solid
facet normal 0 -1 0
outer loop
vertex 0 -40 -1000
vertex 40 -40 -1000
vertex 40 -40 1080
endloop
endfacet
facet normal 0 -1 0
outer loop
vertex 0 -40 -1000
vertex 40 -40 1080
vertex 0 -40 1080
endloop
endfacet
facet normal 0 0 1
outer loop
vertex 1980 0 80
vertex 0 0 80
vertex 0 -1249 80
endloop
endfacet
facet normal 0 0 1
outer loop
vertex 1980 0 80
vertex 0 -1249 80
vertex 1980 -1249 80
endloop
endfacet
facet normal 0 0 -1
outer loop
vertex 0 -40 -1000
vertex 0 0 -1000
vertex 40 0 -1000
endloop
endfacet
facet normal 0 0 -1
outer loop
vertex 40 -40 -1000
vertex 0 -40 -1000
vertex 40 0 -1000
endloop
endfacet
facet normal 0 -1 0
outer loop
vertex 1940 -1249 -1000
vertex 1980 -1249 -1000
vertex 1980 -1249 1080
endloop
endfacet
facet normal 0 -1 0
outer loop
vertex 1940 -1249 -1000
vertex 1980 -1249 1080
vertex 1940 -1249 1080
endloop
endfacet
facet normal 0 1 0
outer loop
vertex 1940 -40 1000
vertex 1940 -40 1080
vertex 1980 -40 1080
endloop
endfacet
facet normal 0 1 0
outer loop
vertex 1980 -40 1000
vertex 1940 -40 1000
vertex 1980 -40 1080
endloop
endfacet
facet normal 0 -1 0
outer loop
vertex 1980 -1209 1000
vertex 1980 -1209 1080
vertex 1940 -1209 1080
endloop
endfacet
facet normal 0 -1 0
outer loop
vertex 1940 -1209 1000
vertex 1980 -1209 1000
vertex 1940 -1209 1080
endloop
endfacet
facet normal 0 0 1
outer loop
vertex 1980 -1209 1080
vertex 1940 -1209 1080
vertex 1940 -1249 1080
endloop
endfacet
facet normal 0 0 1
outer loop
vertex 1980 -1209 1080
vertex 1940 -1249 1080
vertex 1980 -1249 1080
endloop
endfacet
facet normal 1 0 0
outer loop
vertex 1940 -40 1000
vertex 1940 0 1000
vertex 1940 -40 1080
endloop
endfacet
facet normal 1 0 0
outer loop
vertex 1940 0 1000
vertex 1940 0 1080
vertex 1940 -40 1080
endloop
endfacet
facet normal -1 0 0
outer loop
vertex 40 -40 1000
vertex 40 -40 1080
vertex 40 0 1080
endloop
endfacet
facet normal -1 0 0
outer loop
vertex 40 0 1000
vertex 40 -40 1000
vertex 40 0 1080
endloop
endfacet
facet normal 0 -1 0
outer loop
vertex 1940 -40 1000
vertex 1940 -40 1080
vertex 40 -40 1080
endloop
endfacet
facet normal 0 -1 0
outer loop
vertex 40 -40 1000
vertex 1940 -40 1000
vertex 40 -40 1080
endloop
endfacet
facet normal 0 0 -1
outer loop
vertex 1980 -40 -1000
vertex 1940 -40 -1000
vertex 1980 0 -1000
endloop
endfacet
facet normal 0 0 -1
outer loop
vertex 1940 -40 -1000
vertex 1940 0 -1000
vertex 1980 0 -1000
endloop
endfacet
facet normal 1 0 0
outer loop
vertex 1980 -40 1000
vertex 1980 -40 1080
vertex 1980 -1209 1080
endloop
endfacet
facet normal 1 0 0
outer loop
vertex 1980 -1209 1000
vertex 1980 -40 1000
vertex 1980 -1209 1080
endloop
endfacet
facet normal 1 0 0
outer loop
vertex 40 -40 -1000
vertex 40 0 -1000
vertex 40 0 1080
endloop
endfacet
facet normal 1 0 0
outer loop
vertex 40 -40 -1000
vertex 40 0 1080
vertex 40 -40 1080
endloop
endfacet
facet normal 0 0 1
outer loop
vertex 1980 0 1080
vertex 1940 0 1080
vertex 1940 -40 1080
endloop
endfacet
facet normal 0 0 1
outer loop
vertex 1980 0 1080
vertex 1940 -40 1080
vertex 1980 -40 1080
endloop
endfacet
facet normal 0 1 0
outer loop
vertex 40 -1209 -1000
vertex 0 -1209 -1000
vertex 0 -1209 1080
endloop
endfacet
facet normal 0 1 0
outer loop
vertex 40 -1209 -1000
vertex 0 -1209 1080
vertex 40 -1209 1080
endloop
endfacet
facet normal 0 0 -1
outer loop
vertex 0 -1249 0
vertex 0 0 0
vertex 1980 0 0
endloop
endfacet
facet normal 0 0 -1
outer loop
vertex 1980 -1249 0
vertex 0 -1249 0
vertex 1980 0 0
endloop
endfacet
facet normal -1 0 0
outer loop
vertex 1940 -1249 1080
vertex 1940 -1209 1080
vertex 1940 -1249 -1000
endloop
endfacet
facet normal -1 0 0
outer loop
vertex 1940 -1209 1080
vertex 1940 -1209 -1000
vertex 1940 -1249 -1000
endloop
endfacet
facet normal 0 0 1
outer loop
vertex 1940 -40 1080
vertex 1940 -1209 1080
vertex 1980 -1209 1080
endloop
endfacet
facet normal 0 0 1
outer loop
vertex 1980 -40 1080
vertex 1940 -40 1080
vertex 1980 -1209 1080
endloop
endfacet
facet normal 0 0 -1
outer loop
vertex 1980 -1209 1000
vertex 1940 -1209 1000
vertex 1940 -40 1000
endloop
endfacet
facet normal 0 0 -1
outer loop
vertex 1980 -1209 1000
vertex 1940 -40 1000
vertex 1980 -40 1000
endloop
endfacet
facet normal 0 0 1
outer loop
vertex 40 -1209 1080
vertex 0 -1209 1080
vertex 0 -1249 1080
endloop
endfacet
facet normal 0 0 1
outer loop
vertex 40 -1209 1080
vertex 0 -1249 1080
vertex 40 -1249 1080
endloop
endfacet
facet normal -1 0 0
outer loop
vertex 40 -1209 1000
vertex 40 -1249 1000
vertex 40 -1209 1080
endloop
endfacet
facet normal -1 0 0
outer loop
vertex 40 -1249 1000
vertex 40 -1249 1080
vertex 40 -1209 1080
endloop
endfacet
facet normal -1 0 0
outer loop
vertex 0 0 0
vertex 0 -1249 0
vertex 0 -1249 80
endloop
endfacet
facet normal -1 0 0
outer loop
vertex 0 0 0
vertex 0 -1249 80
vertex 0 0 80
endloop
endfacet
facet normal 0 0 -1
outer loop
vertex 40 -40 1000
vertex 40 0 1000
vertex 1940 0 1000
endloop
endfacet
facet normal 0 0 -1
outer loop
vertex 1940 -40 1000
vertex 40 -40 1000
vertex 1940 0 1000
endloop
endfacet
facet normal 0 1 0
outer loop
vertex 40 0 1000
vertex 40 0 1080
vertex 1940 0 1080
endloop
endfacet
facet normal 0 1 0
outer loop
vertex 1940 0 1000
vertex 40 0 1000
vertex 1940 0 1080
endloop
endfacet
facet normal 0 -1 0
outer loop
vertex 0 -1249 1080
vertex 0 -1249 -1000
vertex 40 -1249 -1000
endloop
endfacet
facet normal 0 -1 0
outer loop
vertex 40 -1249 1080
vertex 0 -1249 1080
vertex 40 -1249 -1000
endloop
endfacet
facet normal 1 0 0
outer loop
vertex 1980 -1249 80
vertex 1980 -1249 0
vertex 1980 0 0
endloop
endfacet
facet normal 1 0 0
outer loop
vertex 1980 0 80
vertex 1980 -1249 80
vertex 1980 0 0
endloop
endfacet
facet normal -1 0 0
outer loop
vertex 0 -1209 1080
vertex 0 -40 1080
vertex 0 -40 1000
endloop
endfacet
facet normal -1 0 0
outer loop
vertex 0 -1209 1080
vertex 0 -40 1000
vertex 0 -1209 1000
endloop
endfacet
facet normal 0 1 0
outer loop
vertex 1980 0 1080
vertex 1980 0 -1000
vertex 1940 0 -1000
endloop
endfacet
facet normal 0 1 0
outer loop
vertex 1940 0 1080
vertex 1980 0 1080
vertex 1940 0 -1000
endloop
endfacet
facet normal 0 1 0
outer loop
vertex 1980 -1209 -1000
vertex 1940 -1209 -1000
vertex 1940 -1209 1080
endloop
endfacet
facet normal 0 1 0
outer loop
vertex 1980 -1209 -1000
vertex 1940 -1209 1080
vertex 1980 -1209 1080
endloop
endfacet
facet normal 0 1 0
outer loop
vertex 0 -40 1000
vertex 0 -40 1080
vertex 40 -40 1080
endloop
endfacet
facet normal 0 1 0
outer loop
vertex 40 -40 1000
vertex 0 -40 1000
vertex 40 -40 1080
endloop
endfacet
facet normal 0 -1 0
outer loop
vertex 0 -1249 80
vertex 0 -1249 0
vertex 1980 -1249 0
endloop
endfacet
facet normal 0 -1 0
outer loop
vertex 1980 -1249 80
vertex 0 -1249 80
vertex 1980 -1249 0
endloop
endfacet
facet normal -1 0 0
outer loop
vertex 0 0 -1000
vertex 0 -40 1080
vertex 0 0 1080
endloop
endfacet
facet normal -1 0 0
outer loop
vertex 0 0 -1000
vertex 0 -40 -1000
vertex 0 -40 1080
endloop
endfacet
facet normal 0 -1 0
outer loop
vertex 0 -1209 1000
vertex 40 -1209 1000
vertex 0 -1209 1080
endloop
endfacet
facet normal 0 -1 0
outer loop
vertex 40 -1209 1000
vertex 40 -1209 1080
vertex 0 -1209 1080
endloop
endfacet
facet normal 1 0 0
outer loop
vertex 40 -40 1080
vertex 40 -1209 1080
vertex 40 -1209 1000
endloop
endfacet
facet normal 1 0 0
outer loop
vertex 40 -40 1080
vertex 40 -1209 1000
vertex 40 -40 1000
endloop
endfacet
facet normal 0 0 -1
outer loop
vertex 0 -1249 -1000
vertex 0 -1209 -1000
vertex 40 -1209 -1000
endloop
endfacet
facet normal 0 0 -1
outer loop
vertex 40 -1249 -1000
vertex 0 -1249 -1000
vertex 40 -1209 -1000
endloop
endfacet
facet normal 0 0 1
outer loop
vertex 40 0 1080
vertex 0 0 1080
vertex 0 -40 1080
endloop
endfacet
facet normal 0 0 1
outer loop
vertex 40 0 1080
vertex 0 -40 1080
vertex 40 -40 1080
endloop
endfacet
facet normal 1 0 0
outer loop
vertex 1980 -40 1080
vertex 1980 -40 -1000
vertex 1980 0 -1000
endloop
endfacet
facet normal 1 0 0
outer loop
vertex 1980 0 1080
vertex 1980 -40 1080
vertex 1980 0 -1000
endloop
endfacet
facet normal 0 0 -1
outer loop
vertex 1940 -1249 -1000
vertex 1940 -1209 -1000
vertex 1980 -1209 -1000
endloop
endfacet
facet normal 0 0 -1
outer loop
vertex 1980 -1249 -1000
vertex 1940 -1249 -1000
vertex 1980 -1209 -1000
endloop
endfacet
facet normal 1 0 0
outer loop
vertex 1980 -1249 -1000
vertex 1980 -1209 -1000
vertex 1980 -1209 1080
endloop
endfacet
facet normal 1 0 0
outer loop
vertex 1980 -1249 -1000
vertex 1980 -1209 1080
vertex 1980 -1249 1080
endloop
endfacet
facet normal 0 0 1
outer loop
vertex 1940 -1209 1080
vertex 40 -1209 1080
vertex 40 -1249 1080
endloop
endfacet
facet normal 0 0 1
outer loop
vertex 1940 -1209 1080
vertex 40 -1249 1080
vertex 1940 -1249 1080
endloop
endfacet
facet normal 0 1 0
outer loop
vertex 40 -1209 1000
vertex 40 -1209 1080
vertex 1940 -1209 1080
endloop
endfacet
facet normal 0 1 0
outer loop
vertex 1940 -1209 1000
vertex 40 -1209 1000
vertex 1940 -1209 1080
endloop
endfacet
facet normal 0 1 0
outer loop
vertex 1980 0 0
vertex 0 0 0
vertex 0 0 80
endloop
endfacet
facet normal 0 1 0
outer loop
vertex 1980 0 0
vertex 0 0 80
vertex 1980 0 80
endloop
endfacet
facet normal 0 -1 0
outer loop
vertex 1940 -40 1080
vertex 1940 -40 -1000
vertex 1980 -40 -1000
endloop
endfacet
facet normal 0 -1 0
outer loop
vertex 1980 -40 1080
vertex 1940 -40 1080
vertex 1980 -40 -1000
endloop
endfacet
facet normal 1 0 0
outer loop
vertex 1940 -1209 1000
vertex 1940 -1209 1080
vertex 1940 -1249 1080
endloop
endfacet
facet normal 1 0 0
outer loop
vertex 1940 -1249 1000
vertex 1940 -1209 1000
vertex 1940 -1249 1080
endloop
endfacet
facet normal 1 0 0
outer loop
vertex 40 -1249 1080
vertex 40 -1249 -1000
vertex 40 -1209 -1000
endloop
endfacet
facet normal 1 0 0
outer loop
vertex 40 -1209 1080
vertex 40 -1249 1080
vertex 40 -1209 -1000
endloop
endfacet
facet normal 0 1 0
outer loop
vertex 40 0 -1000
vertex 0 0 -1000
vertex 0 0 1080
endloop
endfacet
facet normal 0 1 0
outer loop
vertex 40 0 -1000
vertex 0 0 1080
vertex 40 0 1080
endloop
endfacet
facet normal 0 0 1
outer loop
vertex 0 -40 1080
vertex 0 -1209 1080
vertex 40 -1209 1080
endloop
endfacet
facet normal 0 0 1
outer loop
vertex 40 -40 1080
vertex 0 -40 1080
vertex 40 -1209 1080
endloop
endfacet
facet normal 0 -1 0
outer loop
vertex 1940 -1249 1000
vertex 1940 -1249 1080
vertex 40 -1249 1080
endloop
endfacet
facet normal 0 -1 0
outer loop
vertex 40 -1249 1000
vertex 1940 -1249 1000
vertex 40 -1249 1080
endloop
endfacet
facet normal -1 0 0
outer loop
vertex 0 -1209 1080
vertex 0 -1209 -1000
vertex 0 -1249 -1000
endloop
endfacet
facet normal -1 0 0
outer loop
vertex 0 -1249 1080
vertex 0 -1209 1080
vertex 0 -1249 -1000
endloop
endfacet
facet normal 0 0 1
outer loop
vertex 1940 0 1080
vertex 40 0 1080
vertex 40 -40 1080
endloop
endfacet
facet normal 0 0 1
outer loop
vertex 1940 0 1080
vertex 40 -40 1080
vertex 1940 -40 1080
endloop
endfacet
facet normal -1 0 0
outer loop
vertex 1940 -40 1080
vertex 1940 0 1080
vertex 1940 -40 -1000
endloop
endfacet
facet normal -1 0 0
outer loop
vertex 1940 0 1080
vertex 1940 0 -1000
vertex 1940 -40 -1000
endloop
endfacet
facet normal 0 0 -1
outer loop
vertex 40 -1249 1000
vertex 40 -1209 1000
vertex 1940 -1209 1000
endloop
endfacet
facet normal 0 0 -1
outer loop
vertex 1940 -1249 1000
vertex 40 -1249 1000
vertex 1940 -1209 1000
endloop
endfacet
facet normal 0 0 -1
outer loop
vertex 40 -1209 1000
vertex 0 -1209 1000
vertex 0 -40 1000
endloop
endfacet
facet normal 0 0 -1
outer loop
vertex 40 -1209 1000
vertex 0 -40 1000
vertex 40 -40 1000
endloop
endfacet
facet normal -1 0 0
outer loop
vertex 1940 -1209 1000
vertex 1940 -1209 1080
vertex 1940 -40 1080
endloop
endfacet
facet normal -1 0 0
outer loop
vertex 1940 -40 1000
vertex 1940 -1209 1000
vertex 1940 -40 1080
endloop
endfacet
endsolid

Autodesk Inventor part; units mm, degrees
ref_plane "YZ Plane" through (0, 0, 0) normal (1, 0, 0) x (0, 1, 0)
ref_plane "XZ Plane" through (0, 0, 0) normal (0, 1, 0) x (-1, 0, 0)
ref_plane "XY Plane" through (0, 0, 0) normal (0, 0, 1) x (1, 0, 0)
sketch "Sketch1" plane through (0, 0, 0) normal (0, 0, 1) x (1, 0, 0)
  line L0 (0, 0) -> (40, 0)
  line L1 (40, 0) -> (40, -40)
  line L2 (40, -40) -> (0, -40)
  line L3 (0, -40) -> (0, 0)
  line L4 (40, 0) -> (1940, 0)
  line L5 (1940, 0) -> (1940, -40)
  line L6 (1940, -40) -> (1980, -40)
  line L7 (1980, -40) -> (1980, 0)
  line L8 (1980, 0) -> (1940, 0)
  line L9 (40, -40) -> (1940, -40)
  line L10 (0, -40) -> (0, -1209)
  line L11 (0, -1209) -> (40, -1209)
  line L12 (40, -1209) -> (40, -40)
  line L13 (0, -1209) -> (0, -1249)
  line L14 (0, -1249) -> (40, -1249)
  line L15 (40, -1249) -> (40, -1209)
  line L16 (1940, -1209) -> (1940, -1249)
  line L17 (1940, -1249) -> (40, -1249)
  line L18 (1940, -1209) -> (1980, -1209)
  line L19 (1980, -1209) -> (1980, -1249)
  line L20 (1980, -1249) -> (1940, -1249)
  line L21 (1940, -1209) -> (1940, -40)
  line L22 (1980, -40) -> (1980, -1209)
  line L23 (40, -1209) -> (1940, -1209)
  line L24 (40, -520) -> (1940, -520)
  line L25 (40, -560) -> (1940, -560)
  line L26 (490, -40) -> (490, -520)
  line L27 (530, -520) -> (530, -40)
  line L28 (830, -40) -> (830, -520)
  line L29 (870, -520) -> (870, -40)
  line L30 (1130, -40) -> (1130, -520)
  line L31 (1170, -520) -> (1170, -40)
  line L32 (1470, -40) -> (1470, -520)
  line L33 (1510, -520) -> (1510, -40)
  line L34 (240, -560) -> (240, -1209)
  line L35 (280, -1209) -> (280, -560)
  line L36 (600, -560) -> (600, -1209)
  line L37 (640, -1209) -> (640, -560)
  line L38 (900, -560) -> (900, -1209)
  line L39 (940, -1209) -> (940, -560)
  line L40 (1060, -560) -> (1060, -1209)
  line L41 (1100, -1209) -> (1100, -560)
  line L42 (1420, -560) -> (1420, -1209)
  line L43 (1460, -1209) -> (1460, -560)
  line L44 (1460, -749.4424) -> (1940, -749.4424)
  line L45 (1940, -749.4424) -> (1940, -789.4424)
  line L46 (1940, -789.4424) -> (1460, -789.4424)
  line L47 (1460, -789.4424) -> (1460, -749.4424)
  line L48 (1460, -984.7722) -> (1940, -984.7722)
  line L49 (1940, -984.7722) -> (1940, -1024.7722)
  line L50 (1940, -1024.7722) -> (1460, -1024.7722)
  line L51 (1460, -1024.7722) -> (1460, -984.7722)
  dimension "d15" = 40
  dimension "d16" = 480
  dimension "d17" = 649
  dimension "d11" = 40
  dimension "d12" = 40
  dimension "d13" = 40
  dimension "d14" = 40
  dimension "d18" = 40
  dimension "d19" = 40
  dimension "d20" = 40
  dimension "d21" = 40
  dimension "d22" = 470
  dimension "d23" = 340
  dimension "d24" = 490
  dimension "d25" = 340
  dimension "d26" = 40
  dimension "d27" = 40
  dimension "d28" = 40
  dimension "d29" = 40
  dimension "d30" = 40
  dimension "d31" = 200
  dimension "d32" = 880
  dimension "d35" = 480
  dimension "d51" = 40
  dimension "d52" = 40
  dimension "d53" = 1980
  dimension "d108" = 360
  dimension "d109" = 240
extrude "Extrusion1" [suppressed]
extrude "Extrusion7" [suppressed]
extrude "Extrusion8" [suppressed]
extrude "Extrusion9" [suppressed]
extrude "Extrusion2" [suppressed]
extrude "Extrusion10" [suppressed]
extrude "Extrusion11" [suppressed]
extrude "Extrusion12" [suppressed]
extrude "Extrusion13" [suppressed]
extrude "Extrusion14" [suppressed]
extrude "Extrusion15" [suppressed]
extrude "Extrusion16" [suppressed]
extrude "Extrusion17" [suppressed]
extrude "Extrusion18" [suppressed]
extrude "Extrusion19" [suppressed]
extrude "Extrusion20" [suppressed]
extrude "Extrusion3" add sketch "Sketch1" along normal blind 1080 and the other way blind 1000 separate body contours L0 L1 L2 L3
extrude "Extrusion21" add sketch "Sketch1" along normal blind 1080 and the other way blind 1000 separate body contours L11 L15 L14 L13
extrude "Extrusion22" add sketch "Sketch1" along normal blind 1080 and the other way blind 1000 separate body contours L19 L20 L16 L18
extrude "Extrusion23" add sketch "Sketch1" along normal blind 1080 and the other way blind 1000 separate body contours L8 L7 L6 L5
sketch "Sketch2" plane through (0, 0, 1080) normal (0, 0, 1) x (1, 0, 0)
  line L0 (0, 0) -> (0, -40) projected
  line L1 (0, -40) -> (40, -40) projected
  line L2 (40, -40) -> (40, 0) projected
  line L3 (40, 0) -> (0, 0) projected
  line L4 (1940, 0) -> (1940, -40) projected
  line L5 (1940, -40) -> (1980, -40) projected
  line L6 (1980, -40) -> (1980, 0) projected
  line L7 (1980, 0) -> (1940, 0) projected
  line L8 (1940, -1209) -> (1940, -1249) projected
  line L9 (1940, -1249) -> (1980, -1249) projected
  line L10 (1980, -1249) -> (1980, -1209) projected
  line L11 (1980, -1209) -> (1940, -1209) projected
  line L12 (0, -1209) -> (0, -1249) projected
  line L13 (0, -1249) -> (40, -1249) projected
  line L14 (40, -1249) -> (40, -1209) projected
  line L15 (40, -1209) -> (0, -1209) projected
  line L16 (0, -1209) -> (40, -1209)
  line L17 (40, -1209) -> (40, -40)
  line L18 (40, -40) -> (0, -40)
  line L19 (0, -40) -> (0, -1209)
  line L20 (40, 0) -> (1940, 0)
  line L21 (1940, 0) -> (1940, -40)
  line L22 (1940, -40) -> (40, -40)
  line L23 (40, -40) -> (40, 0)
  line L24 (1940, -40) -> (1980, -40)
  line L25 (1980, -40) -> (1980, -1209)
  line L26 (1980, -1209) -> (1940, -1209)
  line L27 (1940, -1209) -> (1940, -40)
  line L28 (40, -1209) -> (1940, -1209)
  line L29 (1940, -1209) -> (1940, -1249)
  line L30 (1940, -1249) -> (40, -1249)
  line L31 (40, -1249) -> (40, -1209)
  line L32 (40, -1209) -> (0, -1209) projected
  line L33 (0, -1249) -> (40, -1249) projected
  line L34 (1940, -1209) -> (1940, -1249) projected
  line L35 (1980, -1209) -> (1940, -1209) projected
  line L36 (1940, -40) -> (1980, -40) projected
  line L37 (1940, 0) -> (1940, -40) projected
  line L38 (1980, 0) -> (1940, 0) projected
  line L39 (0, -40) -> (40, -40) projected
extrude "Extrusion4" add sketch "Sketch2" against normal blind 80 separate body contours L1 L17 L15 L19
extrude "Extrusion24" add sketch "Sketch2" against normal blind 80 separate body contours L28 L8 L30 L14
extrude "Extrusion25" add sketch "Sketch2" against normal blind 80 separate body contours L5 L25 L11 L27
extrude "Extrusion26" add sketch "Sketch2" against normal blind 80 separate body contours L20 L4 L22 L2
sketch "Sketch3" plane through (0, 0, 80) normal (0, 0, -1) x (-1, 0, 0)
  line L0 (-850, -1749) -> (-890, -1749)
  line L1 (-890, -1749) -> (-890, -1249)
  line L2 (-890, -1249) -> (-850, -1249)
  line L3 (-850, -1249) -> (-850, -1749)
  line L4 (-1110, -1749) -> (-1150, -1749)
  line L5 (-1150, -1749) -> (-1150, -1249)
  line L6 (-1150, -1249) -> (-1110, -1249)
  line L7 (-1110, -1249) -> (-1110, -1749)
  line L8 (-1940, -1249) -> (-40, -1249) construction
  point P0 (0, 0)
  point P1 (0, -1249)
  dimension "d44" = 40
  dimension "d45" = 40
  dimension "d46" = 300
  dimension "d48" = 500
  dimension "d105" = 850
extrude "Extrusion5" [suppressed]
extrude "Extrusion27" [suppressed]
ref_plane "Work Plane5" through (850, -874.5, 80) normal (0, -1, 0) x (-1, 0, 0)
ref_plane "Work Plane6" through (990, -1209, 0) normal (-1, 0, 0) x (0, 0, 1)
ref_plane "Work Plane7" through (0, 0, 40) normal (0, 0, 1) x (1, 0, 0)
ref_plane "Work Plane8" through (40, -624.5, 1080) normal (0, -1, 0) x (1, 0, 0)
extrude "Extrusion28" add sketch "Sketch1" along normal blind 80 separate body
equation "\"d15\" = d12"
equation "\"d11\" = d13"
equation "\"d14\" = d12"
equation "\"d18\" = d12"
equation "\"d19\" = d12"
equation "\"d20\" = d12"
equation "\"d21\" = d12"
equation "\"d26\" = d12"
equation "\"d27\" = d12"
equation "\"d28\" = d12"
equation "\"d29\" = d12"
equation "\"d30\" = d12"
equation "\"d32\" = d33"
equation "\"d51\" = d12"
equation "\"d52\" = d12"
equation "\"d45\" = d44"
equation "\"d33\" = 880"
properties part number "RobotFab Frame 2"
